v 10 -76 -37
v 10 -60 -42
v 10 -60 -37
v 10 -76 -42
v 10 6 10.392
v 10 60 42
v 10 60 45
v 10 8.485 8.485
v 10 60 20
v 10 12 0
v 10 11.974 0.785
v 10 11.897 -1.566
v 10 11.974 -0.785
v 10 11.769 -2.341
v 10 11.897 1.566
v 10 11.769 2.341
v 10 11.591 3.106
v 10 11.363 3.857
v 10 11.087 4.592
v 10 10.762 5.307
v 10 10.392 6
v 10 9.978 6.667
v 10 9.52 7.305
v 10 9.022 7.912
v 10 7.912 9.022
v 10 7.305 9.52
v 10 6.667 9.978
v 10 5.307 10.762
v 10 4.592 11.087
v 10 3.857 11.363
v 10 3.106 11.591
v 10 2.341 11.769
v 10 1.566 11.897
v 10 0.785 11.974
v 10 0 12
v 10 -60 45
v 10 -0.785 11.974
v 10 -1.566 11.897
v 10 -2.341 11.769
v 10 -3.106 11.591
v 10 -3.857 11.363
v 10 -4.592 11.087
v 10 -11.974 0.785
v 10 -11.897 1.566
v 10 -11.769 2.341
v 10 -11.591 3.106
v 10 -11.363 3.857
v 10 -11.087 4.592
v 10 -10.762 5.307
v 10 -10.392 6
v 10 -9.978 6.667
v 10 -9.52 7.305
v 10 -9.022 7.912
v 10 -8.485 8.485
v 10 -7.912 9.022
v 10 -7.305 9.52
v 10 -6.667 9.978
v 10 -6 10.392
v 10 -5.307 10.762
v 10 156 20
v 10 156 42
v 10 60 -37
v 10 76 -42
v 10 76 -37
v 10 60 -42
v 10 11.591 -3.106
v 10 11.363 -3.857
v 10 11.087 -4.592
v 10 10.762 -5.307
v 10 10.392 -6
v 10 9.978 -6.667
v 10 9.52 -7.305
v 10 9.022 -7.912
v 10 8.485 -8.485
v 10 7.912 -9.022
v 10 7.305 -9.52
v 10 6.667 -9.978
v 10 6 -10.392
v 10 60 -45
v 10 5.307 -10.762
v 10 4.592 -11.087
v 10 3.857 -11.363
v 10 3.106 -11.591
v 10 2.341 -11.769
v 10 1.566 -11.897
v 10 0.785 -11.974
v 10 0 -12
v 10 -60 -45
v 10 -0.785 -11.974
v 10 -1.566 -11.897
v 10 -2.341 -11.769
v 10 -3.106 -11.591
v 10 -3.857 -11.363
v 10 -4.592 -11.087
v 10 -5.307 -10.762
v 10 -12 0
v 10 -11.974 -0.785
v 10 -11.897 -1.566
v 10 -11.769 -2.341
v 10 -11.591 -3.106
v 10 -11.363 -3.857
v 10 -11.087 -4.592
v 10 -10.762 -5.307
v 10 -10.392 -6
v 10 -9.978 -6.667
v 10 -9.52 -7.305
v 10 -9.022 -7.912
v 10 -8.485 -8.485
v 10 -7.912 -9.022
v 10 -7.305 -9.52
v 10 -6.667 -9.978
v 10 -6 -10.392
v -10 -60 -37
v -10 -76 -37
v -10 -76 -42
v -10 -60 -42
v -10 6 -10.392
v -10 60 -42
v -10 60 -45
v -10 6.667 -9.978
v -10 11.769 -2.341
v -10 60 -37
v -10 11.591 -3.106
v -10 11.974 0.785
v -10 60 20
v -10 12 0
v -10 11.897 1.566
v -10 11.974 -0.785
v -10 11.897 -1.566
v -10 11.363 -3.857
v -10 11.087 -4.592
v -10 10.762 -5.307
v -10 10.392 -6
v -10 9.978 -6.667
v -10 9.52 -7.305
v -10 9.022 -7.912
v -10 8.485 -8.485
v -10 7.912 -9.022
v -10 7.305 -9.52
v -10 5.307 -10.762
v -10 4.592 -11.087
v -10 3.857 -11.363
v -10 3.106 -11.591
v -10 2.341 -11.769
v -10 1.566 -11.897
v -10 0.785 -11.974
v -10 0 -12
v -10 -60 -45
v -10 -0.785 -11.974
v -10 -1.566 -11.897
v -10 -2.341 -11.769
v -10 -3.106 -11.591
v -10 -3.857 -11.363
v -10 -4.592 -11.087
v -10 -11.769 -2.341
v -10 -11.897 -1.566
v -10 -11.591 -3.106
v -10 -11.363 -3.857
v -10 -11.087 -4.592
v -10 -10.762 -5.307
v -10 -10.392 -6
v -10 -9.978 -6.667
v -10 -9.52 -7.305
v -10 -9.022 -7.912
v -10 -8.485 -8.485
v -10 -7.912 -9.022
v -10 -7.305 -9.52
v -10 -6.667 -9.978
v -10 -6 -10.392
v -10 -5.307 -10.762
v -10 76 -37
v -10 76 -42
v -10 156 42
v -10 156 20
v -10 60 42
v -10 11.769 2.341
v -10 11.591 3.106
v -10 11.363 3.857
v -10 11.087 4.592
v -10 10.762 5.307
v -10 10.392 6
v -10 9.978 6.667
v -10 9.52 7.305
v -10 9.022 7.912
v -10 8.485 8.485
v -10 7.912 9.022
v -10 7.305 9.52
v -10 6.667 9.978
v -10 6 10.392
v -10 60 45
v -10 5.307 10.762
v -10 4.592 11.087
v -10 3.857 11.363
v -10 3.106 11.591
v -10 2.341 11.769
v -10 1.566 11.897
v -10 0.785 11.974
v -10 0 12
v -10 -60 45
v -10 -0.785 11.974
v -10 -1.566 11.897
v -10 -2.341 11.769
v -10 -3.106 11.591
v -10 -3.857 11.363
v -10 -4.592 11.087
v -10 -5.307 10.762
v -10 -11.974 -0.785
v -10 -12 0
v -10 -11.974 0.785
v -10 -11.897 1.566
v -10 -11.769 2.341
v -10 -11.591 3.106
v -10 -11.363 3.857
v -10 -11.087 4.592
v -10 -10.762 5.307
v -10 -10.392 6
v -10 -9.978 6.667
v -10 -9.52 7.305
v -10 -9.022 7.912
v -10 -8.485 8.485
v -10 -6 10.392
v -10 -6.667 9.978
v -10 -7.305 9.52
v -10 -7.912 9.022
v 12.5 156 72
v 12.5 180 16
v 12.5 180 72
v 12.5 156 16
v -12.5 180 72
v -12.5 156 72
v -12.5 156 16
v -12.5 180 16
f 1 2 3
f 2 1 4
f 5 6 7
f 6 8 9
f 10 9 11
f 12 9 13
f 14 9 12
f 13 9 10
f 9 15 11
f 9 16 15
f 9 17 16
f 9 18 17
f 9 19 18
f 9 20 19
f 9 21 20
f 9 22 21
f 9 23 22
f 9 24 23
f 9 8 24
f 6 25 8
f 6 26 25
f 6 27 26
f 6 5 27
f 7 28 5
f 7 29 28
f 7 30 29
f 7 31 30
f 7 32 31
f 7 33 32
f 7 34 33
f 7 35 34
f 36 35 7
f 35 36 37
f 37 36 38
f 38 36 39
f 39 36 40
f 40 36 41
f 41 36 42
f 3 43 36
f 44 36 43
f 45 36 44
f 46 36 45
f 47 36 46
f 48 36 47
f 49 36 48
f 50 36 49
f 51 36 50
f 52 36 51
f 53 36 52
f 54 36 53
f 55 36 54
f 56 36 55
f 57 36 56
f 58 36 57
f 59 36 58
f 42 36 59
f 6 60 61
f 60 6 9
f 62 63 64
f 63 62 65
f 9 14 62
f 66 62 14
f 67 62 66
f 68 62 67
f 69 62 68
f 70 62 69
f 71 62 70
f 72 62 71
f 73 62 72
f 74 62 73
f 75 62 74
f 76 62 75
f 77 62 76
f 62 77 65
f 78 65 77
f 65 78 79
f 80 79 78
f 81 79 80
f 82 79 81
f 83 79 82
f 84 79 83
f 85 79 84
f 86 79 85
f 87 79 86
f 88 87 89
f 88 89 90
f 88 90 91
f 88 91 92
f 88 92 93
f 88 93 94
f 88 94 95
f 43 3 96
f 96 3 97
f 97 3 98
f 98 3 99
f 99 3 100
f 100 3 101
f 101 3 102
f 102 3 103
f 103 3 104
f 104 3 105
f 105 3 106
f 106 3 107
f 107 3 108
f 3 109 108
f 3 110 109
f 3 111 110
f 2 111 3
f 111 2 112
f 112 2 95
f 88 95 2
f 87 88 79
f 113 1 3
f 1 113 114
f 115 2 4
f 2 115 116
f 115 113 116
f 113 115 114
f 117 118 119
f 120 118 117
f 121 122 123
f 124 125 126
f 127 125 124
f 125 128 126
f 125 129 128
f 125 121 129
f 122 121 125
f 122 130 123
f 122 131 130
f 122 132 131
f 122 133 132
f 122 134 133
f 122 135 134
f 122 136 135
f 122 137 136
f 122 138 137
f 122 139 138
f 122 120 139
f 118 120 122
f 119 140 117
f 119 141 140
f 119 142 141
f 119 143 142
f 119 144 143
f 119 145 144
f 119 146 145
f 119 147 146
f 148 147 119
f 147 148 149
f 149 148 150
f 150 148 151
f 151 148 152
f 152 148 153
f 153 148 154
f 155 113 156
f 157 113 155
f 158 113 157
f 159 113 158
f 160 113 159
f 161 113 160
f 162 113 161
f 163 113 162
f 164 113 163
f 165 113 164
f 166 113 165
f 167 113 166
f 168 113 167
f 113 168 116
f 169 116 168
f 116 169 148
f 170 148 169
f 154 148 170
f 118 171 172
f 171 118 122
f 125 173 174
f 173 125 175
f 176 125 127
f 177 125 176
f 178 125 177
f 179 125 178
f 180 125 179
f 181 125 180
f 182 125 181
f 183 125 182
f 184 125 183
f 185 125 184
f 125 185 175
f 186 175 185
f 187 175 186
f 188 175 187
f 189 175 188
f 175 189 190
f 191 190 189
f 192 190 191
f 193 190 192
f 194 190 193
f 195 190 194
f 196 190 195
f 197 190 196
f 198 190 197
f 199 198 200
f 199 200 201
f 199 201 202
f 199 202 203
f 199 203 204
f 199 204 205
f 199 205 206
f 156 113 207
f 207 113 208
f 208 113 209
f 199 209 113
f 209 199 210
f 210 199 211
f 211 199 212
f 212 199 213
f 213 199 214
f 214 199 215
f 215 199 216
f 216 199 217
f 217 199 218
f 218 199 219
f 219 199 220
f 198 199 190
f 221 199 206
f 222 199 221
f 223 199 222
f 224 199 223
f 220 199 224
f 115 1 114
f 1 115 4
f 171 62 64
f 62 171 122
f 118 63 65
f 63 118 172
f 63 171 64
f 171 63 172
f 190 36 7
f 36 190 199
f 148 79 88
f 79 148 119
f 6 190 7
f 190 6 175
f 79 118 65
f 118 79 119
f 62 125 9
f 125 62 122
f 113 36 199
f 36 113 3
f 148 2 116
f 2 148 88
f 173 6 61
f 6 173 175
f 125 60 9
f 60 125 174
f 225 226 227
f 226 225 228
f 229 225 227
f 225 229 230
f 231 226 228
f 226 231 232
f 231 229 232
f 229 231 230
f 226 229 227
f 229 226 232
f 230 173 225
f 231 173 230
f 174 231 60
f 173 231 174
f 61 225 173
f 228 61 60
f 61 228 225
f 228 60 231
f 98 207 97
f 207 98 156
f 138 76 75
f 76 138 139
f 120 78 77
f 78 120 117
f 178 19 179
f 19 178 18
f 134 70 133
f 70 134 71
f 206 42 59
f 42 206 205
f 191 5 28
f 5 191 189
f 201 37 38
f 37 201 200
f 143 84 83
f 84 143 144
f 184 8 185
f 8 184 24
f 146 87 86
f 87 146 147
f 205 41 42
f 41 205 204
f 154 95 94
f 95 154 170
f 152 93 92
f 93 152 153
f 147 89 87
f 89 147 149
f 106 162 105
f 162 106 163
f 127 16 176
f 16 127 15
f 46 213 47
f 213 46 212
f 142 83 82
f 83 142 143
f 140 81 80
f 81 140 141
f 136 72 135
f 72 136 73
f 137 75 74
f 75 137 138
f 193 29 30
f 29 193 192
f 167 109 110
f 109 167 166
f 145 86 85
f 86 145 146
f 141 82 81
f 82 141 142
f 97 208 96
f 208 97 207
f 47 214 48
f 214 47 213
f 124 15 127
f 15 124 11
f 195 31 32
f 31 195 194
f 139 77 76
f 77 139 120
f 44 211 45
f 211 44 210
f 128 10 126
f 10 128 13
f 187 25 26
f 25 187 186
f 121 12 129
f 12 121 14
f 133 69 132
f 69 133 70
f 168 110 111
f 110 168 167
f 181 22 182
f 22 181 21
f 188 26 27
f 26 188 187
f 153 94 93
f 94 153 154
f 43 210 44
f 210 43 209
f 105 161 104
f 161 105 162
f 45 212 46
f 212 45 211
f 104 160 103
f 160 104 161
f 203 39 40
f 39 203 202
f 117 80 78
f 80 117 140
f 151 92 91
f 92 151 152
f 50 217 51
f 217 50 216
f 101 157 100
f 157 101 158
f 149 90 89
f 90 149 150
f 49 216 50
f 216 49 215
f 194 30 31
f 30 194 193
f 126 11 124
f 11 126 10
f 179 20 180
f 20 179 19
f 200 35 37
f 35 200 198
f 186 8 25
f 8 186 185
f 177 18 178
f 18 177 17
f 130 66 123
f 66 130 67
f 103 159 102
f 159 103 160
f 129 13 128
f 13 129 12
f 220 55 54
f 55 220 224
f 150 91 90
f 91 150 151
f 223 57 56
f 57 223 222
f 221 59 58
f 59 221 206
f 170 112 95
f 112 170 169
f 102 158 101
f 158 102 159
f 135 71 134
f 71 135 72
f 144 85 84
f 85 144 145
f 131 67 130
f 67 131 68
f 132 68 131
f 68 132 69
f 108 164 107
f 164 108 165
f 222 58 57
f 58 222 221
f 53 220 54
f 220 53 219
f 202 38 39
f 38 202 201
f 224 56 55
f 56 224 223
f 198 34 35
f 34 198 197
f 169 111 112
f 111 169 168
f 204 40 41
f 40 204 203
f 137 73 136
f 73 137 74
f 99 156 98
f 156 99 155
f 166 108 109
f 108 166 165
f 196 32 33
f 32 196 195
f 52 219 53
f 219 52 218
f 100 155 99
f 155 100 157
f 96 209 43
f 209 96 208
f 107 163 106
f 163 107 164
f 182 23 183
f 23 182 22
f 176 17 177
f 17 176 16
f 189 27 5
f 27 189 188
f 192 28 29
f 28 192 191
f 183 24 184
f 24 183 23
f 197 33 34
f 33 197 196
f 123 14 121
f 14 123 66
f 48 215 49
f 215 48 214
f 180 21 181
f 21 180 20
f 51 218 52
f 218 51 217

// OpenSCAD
// Millimetres. Select "plate", "sleeve", "rod", or "coupon" before export.
part = "plate";
$fn = 96;

module axial_cylinder(length, diameter) {
    rotate([0, 90, 0]) cylinder(h=length, d=diameter, center=true);
}

module plate() {
    difference() {
        union() {
            cube([20, 120, 90], center=true);
            translate([0, 111, 31]) cube([20, 110, 22], center=true);
            translate([0, 168, 44]) cube([25, 24, 56], center=true);
            for (side = [-1, 1])
                translate([0, side * 67, -39.5]) cube([20, 18, 5], center=true);
        }
        axial_cylinder(22, 24);
    }
}

module sleeve() {
    difference() {
        axial_cylinder(16, 23.8);
        axial_cylinder(18, 10);
    }
}

module rod() {
    union() {
        axial_cylinder(100, 14);
        translate([-48, 0, 22]) cube([25, 25, 55], center=true);
    }
}

module coupon() {
    difference() {
        cube([20, 36, 36], center=true);
        axial_cylinder(22, 24);
    }
}

if (part == "plate") plate();
if (part == "sleeve") sleeve();
if (part == "rod") rod();
if (part == "coupon") coupon();
